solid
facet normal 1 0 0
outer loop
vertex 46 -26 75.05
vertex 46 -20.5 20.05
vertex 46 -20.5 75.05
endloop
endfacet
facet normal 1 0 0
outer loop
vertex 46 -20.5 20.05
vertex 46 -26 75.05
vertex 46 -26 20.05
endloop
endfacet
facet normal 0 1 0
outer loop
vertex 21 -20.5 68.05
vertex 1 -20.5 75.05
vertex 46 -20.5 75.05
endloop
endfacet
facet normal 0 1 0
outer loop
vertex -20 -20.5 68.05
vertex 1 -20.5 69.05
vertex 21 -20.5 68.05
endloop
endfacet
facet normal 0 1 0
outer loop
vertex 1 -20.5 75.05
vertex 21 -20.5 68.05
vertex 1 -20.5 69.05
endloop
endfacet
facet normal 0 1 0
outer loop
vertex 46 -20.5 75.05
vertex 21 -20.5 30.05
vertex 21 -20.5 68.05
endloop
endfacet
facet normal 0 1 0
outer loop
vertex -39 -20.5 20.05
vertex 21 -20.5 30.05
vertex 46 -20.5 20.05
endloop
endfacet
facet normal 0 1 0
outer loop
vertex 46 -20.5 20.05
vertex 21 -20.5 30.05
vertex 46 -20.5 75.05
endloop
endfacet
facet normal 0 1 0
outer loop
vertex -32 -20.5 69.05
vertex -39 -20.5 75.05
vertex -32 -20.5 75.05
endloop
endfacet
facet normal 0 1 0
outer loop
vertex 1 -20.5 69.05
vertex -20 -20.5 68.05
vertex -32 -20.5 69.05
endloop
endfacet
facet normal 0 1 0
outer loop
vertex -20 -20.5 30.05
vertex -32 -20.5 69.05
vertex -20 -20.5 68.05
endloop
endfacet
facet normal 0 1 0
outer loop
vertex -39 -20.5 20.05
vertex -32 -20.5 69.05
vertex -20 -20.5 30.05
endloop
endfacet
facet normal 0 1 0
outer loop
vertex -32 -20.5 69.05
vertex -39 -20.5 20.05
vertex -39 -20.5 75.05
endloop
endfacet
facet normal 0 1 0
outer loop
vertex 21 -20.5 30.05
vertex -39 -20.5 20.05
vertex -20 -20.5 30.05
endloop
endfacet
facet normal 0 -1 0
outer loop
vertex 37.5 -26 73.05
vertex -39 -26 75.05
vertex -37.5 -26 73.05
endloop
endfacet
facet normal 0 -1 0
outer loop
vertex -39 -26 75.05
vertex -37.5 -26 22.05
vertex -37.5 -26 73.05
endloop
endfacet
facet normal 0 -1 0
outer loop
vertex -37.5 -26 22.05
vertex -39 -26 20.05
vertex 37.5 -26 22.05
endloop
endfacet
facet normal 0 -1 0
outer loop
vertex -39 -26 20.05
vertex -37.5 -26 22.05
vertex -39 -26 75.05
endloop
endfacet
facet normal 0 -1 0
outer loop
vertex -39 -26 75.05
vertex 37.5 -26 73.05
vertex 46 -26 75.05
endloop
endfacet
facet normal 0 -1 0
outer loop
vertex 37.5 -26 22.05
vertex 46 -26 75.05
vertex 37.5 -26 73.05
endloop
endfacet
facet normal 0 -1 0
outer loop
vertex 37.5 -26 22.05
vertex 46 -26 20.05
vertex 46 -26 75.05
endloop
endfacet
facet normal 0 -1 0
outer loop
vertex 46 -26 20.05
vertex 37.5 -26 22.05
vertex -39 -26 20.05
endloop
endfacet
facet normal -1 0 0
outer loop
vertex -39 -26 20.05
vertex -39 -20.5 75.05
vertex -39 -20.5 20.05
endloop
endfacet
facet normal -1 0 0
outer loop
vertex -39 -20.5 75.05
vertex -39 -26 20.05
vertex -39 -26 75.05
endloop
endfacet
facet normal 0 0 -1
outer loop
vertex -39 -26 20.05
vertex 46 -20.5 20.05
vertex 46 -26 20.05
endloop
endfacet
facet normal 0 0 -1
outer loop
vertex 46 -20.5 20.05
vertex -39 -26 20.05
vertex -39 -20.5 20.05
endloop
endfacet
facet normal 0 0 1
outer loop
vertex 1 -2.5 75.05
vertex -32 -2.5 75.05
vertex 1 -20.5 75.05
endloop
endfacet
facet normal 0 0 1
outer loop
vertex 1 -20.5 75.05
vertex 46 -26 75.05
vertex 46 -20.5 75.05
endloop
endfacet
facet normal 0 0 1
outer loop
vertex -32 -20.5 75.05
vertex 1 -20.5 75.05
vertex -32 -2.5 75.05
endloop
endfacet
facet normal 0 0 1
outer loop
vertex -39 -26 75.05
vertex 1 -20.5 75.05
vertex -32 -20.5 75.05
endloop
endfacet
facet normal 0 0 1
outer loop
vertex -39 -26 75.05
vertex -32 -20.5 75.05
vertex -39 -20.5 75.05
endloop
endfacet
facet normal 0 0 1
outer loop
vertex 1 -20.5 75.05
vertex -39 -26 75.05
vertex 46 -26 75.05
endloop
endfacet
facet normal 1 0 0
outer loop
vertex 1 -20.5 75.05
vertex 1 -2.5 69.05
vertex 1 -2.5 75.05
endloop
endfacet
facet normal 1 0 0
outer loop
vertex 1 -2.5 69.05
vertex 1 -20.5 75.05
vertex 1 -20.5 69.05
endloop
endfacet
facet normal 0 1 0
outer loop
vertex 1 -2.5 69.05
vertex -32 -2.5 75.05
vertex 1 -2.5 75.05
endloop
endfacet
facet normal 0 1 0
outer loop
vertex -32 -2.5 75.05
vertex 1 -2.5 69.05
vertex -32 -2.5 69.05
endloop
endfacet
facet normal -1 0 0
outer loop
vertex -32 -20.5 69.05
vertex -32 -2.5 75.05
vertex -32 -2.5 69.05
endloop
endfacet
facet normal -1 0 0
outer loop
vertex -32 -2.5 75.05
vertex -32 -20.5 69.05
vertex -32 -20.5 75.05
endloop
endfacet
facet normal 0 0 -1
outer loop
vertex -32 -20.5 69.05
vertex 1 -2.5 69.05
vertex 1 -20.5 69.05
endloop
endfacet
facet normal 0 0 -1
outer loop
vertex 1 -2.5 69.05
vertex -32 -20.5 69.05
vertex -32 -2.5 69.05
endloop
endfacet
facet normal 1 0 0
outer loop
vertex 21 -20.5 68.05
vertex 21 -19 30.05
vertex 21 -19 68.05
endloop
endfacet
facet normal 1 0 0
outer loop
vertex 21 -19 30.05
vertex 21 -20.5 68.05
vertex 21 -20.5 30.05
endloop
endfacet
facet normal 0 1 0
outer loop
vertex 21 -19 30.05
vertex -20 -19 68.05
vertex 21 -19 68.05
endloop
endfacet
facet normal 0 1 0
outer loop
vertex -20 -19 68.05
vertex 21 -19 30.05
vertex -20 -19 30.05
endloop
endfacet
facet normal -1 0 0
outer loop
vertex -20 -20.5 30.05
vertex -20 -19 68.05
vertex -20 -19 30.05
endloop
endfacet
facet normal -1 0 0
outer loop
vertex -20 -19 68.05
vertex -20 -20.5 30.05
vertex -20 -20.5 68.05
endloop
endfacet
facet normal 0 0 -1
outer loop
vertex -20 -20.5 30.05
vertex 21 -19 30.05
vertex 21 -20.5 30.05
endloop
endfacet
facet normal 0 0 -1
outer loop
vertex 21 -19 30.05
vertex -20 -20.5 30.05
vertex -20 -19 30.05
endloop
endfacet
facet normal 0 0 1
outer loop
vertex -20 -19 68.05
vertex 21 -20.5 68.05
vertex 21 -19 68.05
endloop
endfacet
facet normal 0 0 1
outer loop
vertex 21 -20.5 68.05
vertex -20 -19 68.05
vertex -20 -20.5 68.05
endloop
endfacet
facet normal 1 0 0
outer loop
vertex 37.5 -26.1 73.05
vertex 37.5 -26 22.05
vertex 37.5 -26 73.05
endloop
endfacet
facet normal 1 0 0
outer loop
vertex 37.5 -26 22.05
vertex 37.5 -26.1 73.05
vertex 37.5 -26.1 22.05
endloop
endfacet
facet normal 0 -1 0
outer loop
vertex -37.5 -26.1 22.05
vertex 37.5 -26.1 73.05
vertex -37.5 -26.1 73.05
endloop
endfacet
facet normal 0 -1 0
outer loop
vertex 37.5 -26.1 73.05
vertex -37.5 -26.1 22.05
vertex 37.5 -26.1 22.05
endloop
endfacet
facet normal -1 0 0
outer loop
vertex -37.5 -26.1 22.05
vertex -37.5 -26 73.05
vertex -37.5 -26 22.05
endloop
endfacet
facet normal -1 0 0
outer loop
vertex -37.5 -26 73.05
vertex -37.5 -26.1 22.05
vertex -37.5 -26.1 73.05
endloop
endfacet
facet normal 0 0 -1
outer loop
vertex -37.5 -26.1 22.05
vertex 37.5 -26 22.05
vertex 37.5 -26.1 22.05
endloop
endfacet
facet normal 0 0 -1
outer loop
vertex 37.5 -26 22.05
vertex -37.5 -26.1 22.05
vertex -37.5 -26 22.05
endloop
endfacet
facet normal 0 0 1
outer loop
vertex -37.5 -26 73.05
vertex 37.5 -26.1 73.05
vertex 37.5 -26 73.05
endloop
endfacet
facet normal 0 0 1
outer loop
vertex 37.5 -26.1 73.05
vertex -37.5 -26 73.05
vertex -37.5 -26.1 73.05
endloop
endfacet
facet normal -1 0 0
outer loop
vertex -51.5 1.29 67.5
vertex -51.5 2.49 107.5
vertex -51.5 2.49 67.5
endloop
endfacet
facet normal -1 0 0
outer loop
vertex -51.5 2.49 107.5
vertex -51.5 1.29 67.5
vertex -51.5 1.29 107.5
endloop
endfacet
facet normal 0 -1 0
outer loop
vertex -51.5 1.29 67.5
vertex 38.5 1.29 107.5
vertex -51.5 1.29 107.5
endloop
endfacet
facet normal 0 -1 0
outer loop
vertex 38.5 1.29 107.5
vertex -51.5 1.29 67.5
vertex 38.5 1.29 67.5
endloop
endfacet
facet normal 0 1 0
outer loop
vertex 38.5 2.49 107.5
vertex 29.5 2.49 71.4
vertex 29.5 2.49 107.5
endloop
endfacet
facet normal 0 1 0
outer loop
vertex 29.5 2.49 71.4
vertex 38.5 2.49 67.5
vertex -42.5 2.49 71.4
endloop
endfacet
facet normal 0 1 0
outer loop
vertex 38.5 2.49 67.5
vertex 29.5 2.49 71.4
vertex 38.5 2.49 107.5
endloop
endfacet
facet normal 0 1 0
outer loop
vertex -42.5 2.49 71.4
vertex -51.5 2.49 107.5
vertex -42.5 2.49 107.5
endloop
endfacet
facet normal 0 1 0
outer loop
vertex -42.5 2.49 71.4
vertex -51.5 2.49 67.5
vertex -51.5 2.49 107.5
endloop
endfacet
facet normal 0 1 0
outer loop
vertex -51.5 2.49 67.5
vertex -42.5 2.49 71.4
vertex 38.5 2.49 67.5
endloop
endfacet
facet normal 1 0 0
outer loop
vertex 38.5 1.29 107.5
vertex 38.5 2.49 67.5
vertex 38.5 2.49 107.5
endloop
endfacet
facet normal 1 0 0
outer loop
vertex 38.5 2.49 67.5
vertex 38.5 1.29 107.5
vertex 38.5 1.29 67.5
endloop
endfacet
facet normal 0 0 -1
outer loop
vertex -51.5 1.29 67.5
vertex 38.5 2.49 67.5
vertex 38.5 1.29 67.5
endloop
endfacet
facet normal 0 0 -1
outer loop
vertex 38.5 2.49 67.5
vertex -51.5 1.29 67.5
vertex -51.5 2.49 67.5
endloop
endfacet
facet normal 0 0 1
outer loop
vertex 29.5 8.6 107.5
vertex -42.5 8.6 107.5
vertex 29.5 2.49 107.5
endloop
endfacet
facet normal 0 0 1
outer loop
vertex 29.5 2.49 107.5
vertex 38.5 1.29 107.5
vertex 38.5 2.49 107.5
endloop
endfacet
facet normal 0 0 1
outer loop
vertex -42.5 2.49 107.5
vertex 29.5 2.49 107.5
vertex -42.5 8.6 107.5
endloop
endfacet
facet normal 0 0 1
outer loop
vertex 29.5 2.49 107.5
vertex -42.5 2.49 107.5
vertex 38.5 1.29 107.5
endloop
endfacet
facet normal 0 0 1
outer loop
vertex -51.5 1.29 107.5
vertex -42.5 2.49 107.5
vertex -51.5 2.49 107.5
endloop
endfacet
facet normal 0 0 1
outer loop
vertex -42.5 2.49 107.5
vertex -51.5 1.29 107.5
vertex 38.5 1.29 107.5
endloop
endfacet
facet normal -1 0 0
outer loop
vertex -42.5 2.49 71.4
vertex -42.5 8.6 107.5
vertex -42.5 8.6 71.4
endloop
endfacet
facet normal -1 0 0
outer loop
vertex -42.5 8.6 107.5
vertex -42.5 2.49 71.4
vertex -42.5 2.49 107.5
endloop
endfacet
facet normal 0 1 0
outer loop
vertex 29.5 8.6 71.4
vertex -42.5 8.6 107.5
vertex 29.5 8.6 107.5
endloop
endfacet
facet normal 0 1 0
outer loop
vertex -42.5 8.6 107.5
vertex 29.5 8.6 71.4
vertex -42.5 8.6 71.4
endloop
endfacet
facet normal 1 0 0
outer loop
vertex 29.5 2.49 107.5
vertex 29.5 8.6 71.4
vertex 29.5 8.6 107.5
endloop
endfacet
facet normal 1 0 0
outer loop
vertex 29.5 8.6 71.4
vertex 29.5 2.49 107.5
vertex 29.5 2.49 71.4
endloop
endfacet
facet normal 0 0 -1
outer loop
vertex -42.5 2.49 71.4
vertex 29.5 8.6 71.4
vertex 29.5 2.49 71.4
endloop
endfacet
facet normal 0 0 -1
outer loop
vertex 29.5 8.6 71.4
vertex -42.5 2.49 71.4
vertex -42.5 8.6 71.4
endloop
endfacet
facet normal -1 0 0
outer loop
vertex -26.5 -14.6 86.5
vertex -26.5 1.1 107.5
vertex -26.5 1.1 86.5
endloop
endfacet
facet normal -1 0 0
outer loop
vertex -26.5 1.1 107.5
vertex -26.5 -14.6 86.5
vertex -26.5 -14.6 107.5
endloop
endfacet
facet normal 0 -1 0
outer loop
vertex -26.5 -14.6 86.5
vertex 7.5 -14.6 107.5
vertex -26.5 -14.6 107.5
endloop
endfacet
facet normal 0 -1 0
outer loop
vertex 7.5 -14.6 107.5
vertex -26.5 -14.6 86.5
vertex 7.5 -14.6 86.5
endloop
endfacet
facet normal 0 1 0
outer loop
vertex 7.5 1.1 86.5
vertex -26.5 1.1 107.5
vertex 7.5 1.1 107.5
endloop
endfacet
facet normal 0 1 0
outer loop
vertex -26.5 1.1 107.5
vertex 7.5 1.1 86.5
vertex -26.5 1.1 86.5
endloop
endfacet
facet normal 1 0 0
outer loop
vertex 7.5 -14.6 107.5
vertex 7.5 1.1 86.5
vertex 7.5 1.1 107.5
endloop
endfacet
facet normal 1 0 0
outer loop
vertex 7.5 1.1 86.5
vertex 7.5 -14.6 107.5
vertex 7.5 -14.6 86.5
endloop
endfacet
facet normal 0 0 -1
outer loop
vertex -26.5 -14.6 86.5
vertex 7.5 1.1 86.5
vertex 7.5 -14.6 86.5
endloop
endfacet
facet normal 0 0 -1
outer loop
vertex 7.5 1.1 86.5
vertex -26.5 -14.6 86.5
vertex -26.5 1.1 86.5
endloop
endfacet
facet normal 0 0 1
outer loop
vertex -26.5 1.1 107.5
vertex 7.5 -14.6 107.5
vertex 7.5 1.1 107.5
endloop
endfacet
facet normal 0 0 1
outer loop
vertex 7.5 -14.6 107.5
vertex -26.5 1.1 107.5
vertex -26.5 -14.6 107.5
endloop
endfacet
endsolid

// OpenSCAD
explode = 0.01;
opacity = 0.5;
show_door = true;
show_box = true;
show_deco = true;
show_battery = false;
show_stereopi = true;
simplified_stereopi = true;

module bottom() {
    linear_extrude(height = 3)
        import("exported_parts/p_bottom.dxf");
}

module sideL() {
    rotate([90, 0, -90])
        linear_extrude(height = 3)
            import("exported_parts/p_side.dxf");
}

module sideR() {
    rotate([90, 0, -90])
        translate([0, 0, -3])
            linear_extrude(height = 3)
                import("exported_parts/p_side.dxf");
}

module front() {
    rotate([90, 0, 0])
        linear_extrude(height = 3)
            import("exported_parts/p_front.dxf");
}

module backT() {
    rotate([90, 0, 0])
        translate([0, 0, -3])
            linear_extrude(height = 3)
                import("exported_parts/p_back.dxf");
}

module backB() {
    rotate([-90, 0, 0])
        linear_extrude(height = 3)
            import("exported_parts/p_back.dxf");
}

module top() {
    translate([0, 0, -3])
        linear_extrude(height = 3)
            import("exported_parts/p_top.dxf");
}

module door() {
    rotate([90, 0, 0])
        translate([0, 0, -3])
            linear_extrude(height = 3)
                import("exported_parts/p_door.dxf");
}

module caps() {
    linear_extrude(height = 3)
        import("exported_parts/p_caps.dxf");
}

module tongue() {
    linear_extrude(height = 3)
        import("exported_parts/p_tongue.dxf");
}

module screen_bottomL() {
    rotate([90, 0, 90])
        linear_extrude(height = 3)
            import("exported_parts/p_screen_bottom.dxf");
}

module screen_bottomR() {
    rotate([90, 0, 90])
        translate([0, 0, -3])
            linear_extrude(height = 3)
                import("exported_parts/p_screen_bottom.dxf");
}

module screen_top() {
    linear_extrude(height = 3)
        import("exported_parts/p_screen_top.dxf");
}

module stpiholder() {
    rotate([90, 0, 0])
        linear_extrude(height = 3)
            import("exported_parts/p_stpiholder.dxf");
}

module deco() {
    rotate([90, 0, 0])
        linear_extrude(height = 3)
            import("exported_parts/p_deco.dxf");
}

module assembly() {
    if (show_box) {
        translate([0, 0, -explode]) bottom();
        translate([60 + explode, 0, 0]) sideL();
        translate([-60 - explode, 0, 0]) sideR();
        translate([0, 26 + explode, 120]) backT();
        translate([0, 26 + explode, 43]) backB();
        translate([0, 0, 160 + explode]) top();
    }
    translate([0, -26 - explode, 0]) front();
    translate([0, -25, 136]) caps();
    translate([0, -26, 90]) tongue();
    translate([28.5, -29, 0]) screen_bottomL();
    translate([-28.5, -29, 0]) screen_bottomR();
    translate([0, -18 + explode, 41]) screen_top();
    translate([0, 11 + explode, 62]) stpiholder();
    if (show_door)
        translate([0, 23, 30 * explode]) door();
    if (show_deco)
        translate([0, -29 - 2 * explode, 90]) deco();
}

module stereopi() {
    translate([-6.5, -8.9, 85.9]) {
        rotate([90, 180, 0]) {
            translate([-45, -21.6, -11.39])
                cube([90, 40, 1.2]);
            translate([-36, -21.6, -17.5])
                color("red") cube([72,36.1,7]);
            if (simplified_stereopi) {
                translate([-14, -21.6, -10])
                    cube([34,21,15.7]);
            } else {
                import("/tmp/sp.stl"); // Requieres the STL stereopi model to display it.
            }
            translate([32.5, 10.85, 17.1]) {
                rotate([0, 180, 0]) {
                    union() {
                        cube([85,55,5.5]);
                        translate([7, 0, 5.5])
                            cube([33,6,18]);
                        translate([19,7,5.5])
                            color("red") cube([41,38,1.5]);
                        translate([1.5, 2,-0.1])
                            color("white") cube([75, 51, 0.1]);
                    }
                }
            }
        }
    }
}

module battery() {
    translate([-10, 9, 169])
        difference() {
            cube([140, 75, 18], center=true);
            translate([-55, -27, 0])
                cylinder(r=3.5, h=20, center=true);
        }
}

%color([0.85, 0.79, 0.69, opacity])
    assembly();
if (show_battery) battery();
if (show_stereopi) stereopi();
